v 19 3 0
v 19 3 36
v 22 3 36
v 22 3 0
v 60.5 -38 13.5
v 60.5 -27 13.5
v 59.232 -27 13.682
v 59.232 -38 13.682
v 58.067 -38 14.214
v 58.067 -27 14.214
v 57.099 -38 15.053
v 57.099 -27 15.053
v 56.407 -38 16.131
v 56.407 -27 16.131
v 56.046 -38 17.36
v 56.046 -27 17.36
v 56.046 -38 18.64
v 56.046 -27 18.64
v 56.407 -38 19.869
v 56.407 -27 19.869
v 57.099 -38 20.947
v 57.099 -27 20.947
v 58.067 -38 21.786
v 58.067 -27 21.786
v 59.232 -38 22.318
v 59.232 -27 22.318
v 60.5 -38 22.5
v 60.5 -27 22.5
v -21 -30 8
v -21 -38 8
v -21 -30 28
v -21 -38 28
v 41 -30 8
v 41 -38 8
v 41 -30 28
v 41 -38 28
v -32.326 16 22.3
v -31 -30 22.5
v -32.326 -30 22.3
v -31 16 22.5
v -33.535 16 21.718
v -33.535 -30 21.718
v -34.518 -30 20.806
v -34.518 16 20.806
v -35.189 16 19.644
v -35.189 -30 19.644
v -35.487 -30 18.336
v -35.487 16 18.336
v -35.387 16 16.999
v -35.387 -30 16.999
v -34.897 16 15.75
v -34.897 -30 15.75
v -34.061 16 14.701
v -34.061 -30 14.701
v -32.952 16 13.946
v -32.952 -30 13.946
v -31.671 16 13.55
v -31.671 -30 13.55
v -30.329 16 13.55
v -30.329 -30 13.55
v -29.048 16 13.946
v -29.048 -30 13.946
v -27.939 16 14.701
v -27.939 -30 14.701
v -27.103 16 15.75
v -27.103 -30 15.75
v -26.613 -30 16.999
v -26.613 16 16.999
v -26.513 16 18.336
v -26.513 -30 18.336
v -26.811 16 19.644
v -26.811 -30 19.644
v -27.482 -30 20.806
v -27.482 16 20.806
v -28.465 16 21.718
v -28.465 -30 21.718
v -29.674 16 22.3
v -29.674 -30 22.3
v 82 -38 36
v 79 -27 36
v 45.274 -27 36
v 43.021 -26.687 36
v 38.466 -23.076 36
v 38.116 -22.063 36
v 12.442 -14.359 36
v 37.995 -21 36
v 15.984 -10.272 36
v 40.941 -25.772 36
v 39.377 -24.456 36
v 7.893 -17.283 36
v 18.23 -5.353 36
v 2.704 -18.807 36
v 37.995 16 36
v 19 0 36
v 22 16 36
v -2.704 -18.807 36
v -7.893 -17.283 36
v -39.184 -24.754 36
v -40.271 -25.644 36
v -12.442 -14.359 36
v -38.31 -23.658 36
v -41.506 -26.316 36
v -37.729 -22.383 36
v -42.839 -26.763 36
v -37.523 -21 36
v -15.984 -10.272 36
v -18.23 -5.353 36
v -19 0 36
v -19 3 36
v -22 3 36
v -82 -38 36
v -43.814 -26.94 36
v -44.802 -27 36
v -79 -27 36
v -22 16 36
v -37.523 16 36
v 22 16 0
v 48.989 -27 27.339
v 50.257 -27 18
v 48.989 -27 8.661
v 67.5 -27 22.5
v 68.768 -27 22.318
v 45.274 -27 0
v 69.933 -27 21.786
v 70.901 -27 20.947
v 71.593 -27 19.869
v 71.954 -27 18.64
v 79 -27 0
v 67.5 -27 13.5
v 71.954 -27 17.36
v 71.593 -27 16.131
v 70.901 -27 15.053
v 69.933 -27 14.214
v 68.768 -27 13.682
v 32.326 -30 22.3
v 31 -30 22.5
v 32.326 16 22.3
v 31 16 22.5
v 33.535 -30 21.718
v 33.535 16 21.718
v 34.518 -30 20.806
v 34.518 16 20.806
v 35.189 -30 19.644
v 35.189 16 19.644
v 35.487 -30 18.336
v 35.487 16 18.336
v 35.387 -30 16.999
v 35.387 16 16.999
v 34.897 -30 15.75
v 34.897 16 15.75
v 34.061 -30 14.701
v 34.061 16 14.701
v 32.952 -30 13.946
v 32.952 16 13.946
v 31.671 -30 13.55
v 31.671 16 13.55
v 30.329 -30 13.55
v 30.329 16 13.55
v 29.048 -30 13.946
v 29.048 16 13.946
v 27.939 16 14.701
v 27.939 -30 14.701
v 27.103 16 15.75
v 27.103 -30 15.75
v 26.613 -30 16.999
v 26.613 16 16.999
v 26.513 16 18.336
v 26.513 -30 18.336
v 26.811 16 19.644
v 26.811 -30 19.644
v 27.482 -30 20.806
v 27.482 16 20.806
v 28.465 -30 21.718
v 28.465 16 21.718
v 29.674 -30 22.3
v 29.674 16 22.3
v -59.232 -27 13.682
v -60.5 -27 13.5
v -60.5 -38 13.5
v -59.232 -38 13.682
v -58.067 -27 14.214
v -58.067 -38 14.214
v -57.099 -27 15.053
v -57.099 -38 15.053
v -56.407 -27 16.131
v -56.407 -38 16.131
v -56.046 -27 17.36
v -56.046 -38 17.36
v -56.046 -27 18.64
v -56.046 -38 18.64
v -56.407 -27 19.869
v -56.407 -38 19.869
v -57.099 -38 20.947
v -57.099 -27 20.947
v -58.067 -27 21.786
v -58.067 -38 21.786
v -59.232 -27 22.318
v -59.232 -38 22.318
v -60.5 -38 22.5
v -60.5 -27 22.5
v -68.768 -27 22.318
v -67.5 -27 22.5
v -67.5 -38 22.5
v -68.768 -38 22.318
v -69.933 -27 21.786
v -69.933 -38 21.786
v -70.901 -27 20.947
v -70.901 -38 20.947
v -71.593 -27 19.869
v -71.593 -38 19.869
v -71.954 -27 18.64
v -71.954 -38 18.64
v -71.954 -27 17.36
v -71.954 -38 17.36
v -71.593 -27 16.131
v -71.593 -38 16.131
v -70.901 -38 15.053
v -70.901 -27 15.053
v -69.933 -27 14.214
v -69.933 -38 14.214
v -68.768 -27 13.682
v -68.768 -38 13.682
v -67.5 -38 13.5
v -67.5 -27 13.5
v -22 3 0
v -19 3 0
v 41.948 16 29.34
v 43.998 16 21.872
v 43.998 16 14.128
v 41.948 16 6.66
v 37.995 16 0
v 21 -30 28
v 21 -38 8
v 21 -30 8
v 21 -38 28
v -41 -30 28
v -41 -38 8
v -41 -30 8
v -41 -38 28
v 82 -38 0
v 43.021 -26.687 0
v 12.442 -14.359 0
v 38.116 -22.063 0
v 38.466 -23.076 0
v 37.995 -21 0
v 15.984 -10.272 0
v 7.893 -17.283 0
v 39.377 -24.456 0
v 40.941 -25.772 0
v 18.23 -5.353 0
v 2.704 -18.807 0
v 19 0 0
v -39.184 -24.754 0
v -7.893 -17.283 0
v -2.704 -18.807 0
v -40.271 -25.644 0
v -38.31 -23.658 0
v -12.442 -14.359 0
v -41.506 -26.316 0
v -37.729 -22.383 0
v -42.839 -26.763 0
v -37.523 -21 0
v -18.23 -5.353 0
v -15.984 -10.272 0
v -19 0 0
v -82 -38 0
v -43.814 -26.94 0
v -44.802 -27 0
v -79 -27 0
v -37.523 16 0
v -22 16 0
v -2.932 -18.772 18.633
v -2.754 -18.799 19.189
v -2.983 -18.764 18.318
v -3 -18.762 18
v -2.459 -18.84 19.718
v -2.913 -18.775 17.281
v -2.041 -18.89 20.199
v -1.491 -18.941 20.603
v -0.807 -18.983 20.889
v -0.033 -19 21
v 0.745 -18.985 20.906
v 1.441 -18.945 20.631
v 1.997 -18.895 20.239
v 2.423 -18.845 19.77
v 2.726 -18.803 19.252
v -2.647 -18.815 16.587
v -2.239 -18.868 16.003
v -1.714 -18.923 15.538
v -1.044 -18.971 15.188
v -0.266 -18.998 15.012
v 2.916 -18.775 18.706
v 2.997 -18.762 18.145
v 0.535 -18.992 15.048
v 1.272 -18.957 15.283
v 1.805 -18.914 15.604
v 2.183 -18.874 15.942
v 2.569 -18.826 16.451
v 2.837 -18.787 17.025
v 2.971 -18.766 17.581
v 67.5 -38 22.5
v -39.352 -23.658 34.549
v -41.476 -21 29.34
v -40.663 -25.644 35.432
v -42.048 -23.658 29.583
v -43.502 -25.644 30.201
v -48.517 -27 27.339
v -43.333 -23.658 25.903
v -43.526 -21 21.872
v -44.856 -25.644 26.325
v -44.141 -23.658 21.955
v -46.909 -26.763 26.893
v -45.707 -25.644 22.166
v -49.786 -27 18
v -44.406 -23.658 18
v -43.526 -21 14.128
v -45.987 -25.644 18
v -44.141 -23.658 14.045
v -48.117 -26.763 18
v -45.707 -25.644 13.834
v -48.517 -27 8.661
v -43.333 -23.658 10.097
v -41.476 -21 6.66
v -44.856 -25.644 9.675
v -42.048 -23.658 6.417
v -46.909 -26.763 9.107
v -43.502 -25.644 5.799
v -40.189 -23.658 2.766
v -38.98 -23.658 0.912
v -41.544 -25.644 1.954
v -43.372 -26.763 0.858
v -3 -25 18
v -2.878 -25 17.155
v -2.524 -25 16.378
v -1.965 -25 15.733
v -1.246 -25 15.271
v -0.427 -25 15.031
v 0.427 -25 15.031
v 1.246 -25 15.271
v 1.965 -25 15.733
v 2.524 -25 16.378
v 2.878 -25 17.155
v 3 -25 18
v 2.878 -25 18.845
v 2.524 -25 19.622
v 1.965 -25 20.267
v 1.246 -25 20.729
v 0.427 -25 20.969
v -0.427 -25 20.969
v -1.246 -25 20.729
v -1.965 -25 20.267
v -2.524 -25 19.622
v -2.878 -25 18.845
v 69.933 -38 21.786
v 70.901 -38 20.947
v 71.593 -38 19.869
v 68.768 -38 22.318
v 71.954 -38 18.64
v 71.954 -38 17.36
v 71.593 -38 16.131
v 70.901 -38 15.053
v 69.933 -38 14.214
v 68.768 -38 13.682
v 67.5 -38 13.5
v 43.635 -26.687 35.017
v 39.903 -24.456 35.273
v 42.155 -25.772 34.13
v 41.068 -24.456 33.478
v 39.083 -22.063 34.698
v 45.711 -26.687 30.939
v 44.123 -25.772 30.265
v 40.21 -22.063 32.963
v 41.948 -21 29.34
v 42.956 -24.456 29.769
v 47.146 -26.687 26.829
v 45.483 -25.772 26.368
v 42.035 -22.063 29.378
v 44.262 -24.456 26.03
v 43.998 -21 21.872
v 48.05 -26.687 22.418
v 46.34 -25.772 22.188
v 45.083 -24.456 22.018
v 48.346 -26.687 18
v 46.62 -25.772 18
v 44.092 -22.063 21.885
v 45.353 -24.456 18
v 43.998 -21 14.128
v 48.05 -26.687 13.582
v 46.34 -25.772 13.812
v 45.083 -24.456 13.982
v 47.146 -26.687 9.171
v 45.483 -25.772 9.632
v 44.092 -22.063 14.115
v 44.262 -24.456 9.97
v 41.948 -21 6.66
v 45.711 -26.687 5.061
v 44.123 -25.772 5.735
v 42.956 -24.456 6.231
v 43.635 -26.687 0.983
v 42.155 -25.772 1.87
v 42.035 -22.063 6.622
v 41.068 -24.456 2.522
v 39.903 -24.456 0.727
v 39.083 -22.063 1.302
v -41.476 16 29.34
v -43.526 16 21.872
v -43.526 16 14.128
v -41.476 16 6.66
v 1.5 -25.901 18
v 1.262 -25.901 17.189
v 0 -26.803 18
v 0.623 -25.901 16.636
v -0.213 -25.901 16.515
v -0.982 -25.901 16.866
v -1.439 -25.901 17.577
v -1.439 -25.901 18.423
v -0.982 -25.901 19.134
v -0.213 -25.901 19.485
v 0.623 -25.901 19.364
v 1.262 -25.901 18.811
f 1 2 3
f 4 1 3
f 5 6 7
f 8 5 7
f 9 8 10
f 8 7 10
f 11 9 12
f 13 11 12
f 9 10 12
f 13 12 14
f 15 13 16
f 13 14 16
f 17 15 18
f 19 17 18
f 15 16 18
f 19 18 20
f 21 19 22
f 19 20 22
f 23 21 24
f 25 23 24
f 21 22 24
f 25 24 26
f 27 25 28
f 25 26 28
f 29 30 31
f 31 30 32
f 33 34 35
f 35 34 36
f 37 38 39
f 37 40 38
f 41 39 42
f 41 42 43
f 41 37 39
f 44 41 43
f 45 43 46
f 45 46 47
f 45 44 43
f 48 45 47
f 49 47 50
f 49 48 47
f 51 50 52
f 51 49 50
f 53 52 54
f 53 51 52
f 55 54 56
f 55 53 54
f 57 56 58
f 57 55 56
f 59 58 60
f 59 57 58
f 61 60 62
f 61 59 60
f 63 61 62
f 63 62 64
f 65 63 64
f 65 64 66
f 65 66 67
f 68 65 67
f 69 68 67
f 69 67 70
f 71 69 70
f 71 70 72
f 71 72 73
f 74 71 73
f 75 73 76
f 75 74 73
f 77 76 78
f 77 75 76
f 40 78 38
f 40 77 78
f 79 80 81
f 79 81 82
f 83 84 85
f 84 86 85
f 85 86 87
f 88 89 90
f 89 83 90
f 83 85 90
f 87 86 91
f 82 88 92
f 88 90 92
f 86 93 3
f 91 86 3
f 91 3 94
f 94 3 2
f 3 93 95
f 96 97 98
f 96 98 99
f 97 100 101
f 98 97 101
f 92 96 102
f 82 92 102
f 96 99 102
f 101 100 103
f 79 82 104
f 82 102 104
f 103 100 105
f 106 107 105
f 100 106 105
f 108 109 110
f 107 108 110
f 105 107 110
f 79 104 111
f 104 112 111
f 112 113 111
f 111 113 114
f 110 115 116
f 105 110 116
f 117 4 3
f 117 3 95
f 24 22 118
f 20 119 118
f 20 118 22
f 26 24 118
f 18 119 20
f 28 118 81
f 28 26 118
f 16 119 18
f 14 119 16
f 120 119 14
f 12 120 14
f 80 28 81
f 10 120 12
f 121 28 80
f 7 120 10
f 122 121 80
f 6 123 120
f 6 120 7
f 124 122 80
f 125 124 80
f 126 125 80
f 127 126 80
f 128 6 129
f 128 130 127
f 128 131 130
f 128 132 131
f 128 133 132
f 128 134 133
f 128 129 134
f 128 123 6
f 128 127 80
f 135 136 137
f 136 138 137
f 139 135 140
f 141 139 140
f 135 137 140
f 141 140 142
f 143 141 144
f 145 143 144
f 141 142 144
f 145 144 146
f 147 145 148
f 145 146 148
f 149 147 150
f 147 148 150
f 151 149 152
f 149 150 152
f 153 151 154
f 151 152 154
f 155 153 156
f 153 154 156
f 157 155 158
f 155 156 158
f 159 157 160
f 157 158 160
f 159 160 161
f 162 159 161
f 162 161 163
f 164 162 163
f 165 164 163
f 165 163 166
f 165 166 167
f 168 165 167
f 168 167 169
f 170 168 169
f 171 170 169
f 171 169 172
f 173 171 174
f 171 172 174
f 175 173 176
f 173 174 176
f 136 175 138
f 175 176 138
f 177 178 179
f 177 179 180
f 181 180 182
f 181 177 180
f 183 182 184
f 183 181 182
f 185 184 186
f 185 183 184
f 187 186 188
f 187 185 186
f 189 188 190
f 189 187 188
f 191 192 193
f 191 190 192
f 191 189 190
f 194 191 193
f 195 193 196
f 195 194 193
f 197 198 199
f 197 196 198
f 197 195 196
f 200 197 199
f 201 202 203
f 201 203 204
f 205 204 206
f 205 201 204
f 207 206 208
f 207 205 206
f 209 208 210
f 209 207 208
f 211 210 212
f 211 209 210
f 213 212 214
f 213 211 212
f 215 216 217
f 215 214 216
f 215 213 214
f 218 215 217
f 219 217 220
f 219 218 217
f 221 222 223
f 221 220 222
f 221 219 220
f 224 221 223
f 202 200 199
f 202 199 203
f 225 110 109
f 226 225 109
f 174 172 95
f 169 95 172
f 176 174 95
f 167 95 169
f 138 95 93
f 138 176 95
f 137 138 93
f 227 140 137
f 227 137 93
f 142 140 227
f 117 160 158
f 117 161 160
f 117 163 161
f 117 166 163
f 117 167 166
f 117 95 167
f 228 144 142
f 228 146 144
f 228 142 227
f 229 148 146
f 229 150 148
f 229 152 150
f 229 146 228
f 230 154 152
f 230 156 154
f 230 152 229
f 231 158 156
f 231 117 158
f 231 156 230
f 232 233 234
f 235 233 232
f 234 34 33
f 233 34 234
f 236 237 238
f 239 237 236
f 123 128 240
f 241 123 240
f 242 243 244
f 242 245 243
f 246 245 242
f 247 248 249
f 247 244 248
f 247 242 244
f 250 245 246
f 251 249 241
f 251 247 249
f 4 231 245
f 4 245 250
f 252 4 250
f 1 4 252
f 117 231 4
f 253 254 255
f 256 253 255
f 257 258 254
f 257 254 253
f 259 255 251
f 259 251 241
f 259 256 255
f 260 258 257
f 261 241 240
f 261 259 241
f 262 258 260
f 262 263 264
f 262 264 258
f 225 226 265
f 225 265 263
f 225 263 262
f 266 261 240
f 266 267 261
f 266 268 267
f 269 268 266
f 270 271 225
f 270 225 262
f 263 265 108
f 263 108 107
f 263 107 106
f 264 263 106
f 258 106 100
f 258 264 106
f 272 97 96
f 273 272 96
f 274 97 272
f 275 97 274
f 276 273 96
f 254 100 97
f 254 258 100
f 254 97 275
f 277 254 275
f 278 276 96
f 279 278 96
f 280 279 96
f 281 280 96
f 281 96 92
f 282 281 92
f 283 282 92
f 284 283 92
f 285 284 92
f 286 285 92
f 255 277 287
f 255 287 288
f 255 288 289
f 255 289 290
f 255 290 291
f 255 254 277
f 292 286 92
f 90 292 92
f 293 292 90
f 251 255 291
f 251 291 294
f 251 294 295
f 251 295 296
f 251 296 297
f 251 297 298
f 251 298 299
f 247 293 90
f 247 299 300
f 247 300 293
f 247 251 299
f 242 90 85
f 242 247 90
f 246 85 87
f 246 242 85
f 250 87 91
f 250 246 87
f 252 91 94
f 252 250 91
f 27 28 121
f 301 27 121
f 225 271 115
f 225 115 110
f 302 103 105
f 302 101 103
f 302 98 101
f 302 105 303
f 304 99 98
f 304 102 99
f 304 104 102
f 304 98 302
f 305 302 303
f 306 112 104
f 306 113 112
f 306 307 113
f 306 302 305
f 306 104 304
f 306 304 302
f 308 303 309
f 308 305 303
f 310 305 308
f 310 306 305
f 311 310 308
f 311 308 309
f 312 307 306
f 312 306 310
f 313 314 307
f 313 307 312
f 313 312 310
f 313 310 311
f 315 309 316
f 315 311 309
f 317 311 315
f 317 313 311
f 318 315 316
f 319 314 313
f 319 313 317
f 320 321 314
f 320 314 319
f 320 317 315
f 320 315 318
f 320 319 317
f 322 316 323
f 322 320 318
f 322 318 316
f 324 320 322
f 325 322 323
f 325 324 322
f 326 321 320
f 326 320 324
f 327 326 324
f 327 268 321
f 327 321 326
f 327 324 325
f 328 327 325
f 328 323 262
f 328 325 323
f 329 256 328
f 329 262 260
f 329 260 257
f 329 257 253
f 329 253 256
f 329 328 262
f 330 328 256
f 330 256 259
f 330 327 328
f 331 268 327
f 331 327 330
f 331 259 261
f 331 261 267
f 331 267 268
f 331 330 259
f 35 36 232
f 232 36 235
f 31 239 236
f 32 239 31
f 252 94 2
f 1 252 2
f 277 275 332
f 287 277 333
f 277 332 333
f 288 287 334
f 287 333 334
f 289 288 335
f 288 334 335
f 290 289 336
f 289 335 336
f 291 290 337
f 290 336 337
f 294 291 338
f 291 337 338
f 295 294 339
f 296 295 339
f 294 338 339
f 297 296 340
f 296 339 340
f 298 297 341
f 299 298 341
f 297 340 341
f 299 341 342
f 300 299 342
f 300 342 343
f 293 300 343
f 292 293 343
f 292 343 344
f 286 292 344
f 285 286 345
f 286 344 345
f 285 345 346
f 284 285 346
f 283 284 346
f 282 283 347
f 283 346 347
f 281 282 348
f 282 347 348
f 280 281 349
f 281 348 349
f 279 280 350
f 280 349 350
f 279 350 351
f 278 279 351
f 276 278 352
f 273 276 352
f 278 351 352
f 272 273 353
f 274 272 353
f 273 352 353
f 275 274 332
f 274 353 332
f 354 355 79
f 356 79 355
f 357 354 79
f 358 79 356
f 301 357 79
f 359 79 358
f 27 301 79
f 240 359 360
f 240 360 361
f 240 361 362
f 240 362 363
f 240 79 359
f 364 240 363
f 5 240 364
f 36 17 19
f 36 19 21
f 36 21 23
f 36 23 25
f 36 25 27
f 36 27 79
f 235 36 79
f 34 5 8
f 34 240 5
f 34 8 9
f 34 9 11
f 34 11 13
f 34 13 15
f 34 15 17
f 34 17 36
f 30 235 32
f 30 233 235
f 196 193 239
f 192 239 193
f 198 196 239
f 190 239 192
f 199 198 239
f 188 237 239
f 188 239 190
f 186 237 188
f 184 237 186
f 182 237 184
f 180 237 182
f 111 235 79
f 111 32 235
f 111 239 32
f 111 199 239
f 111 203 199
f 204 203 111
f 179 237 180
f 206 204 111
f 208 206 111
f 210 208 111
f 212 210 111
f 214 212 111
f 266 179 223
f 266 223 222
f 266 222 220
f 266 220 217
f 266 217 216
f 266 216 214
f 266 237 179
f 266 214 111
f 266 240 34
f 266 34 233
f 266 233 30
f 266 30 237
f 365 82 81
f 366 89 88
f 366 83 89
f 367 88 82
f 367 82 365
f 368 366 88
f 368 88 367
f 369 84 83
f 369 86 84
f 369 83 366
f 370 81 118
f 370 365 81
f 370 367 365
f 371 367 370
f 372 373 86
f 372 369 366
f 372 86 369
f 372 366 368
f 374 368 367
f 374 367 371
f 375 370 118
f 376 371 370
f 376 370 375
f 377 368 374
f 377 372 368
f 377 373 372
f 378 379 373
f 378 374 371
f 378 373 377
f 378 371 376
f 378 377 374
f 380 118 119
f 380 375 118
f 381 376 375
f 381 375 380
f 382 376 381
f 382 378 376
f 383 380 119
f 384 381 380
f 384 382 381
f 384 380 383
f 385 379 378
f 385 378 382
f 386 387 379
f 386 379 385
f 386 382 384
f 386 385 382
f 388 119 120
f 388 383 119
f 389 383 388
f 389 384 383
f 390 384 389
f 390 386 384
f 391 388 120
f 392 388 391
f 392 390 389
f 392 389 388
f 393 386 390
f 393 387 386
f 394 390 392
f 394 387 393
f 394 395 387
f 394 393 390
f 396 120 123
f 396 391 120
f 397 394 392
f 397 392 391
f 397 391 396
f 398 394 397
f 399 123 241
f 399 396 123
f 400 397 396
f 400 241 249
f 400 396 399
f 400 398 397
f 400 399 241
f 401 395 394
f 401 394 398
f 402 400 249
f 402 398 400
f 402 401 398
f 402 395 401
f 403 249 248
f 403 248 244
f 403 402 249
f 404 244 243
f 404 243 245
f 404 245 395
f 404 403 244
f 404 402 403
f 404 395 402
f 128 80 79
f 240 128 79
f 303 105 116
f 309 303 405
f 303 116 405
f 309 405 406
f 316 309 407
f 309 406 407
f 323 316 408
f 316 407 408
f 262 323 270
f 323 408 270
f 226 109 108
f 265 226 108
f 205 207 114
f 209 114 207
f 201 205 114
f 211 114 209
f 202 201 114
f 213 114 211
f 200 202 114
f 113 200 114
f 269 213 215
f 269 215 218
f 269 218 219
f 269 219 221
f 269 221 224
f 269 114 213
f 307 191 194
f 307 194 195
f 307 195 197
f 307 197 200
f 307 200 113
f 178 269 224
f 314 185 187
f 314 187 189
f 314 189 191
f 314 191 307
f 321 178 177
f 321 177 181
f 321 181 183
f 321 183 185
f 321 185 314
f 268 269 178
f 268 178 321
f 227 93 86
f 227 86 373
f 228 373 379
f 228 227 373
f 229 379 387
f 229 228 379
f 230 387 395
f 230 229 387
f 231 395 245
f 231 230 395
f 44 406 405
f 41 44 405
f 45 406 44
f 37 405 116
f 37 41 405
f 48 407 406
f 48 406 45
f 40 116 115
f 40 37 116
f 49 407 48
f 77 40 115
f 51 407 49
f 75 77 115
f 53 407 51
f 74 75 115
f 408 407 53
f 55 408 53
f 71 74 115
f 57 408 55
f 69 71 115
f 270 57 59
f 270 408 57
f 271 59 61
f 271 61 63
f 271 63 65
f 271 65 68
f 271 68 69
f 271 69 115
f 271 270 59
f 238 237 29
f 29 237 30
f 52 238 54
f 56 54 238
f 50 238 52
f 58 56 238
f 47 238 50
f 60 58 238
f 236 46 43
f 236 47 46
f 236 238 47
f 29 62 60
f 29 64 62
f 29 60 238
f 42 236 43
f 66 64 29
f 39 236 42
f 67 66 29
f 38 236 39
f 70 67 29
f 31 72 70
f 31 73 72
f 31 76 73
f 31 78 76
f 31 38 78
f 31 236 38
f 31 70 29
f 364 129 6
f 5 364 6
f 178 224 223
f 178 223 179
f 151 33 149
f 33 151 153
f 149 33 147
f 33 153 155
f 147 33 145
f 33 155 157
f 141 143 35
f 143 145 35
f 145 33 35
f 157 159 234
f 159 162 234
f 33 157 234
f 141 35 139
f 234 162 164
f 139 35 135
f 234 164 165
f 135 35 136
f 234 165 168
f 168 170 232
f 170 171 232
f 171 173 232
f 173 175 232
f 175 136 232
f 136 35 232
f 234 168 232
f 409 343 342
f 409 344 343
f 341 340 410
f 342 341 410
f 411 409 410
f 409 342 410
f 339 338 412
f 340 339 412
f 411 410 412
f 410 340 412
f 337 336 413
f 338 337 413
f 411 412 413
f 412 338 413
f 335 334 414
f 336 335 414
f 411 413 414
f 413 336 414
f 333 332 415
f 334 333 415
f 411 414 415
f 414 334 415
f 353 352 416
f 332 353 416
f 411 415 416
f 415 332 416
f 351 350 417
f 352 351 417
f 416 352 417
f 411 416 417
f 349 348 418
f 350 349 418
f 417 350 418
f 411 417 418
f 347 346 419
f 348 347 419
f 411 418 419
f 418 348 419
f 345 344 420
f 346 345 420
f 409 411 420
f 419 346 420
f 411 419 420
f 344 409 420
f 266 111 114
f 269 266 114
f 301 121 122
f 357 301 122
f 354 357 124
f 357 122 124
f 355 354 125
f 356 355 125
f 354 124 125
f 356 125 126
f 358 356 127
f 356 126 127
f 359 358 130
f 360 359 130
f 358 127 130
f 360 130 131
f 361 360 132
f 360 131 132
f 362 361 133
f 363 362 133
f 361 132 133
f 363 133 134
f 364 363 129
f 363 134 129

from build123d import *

# Parameters (mm, degrees)
BOSS_EXTRUDE2_DEPTH       = 36
CUT_EXTRUDE1_DEPTH        = 43
FILLET1_R                 = 6
CUT_EXTRUDE2_DEPTH        = 43
FILLET2_R                 = 6
F_6_0MM_DOWEL_HOLE1_D     = 6
F_6_0MM_DOWEL_HOLE1_DEPTH = 6
F_6_0MM_DOWEL_HOLE1_TIP   = 1.802581857
SKETCH23_W                = 20
SKETCH23_H                = 20
CUT_EXTRUDE4_DEPTH        = 8
CUT_EXTRUDE5_DEPTH        = 12.0000001


with BuildPart() as part:
    # Sketch1 → Boss-Extrude2 (new body)
    with BuildSketch(Plane.XY):
        with BuildLine():
            Line((50, -27), (79, -27))
            Line((79, -27), (82, -38))
            Line((82, -38), (-82, -38))
            Line((-82, -38), (-79, -27))
            Line((-79, -27), (-50, -27))
            Line((-50, -27), (-50, 16))
            Line((-50, 16), (-22, 16))
            Line((-22, 16), (-22, 3))
            Line((-22, 3), (-19, 3))
            Line((-19, 3), (-19, 0))
            ThreePointArc((-19, 0), (0, -19), (19, 0))
            Line((19, 0), (19, 3))
            Line((19, 3), (22, 3))
            Line((22, 3), (22, 16))
            Line((22, 16), (50, 16))
            Line((50, 16), (50, -27))
        make_face()
    extrude(amount=BOSS_EXTRUDE2_DEPTH)

    # Sketch11 → Cut-Extrude1 (cut)
    with BuildSketch(Plane(origin=(0, 16, 0), x_dir=(1, 0, 0), z_dir=(0, 1, 0))):
        with BuildLine():
            Line((-50, 0), (-50, -36))
            Line((-50, -36), (-37.523326079, -36))
            ThreePointArc((-37.523326079, -36), (-43.785692077, -18), (-37.523326079, 0))
            Line((-37.523326079, 0), (-50, 0))
        make_face()
    extrude(amount=-CUT_EXTRUDE1_DEPTH, mode=Mode.SUBTRACT)

    # Fillet1
    fillet1_edges = [part.edges().sort_by_distance(p)[0] for p in [
        (-43.785692077, -27, 18),
    ]]
    fillet(fillet1_edges, radius=FILLET1_R)

    # Sketch12 → Cut-Extrude2 (cut)
    with BuildSketch(Plane(origin=(0, 16, 0), x_dir=(1, 0, 0), z_dir=(0, 1, 0))):
        with BuildLine():
            Line((37.994971795, 0), (50, 0))
            Line((50, 0), (50, -36))
            Line((50, -36), (37.994971795, -36))
            ThreePointArc((37.994971795, -36), (44.257337793, -18), (37.994971795, 0))
        make_face()
    extrude(amount=-CUT_EXTRUDE2_DEPTH, mode=Mode.SUBTRACT)

    # Fillet2
    fillet2_edges = [part.edges().sort_by_distance(p)[0] for p in [
        (44.257337793, -27, 18),
    ]]
    fillet(fillet2_edges, radius=FILLET2_R)

    # Ø6.0mm Dowel Hole1
    with Locations(Plane(origin=(0, -19, 18), x_dir=(1, 0, 0), z_dir=(0, 1, 0))):
        with Locations((0, 0)):
            Hole(F_6_0MM_DOWEL_HOLE1_D / 2, depth=F_6_0MM_DOWEL_HOLE1_DEPTH)
            with Locations((0, 0, -(F_6_0MM_DOWEL_HOLE1_DEPTH + F_6_0MM_DOWEL_HOLE1_TIP / 2))):  # 118° drill point
                Cone(0, F_6_0MM_DOWEL_HOLE1_D / 2, F_6_0MM_DOWEL_HOLE1_TIP, mode=Mode.SUBTRACT)

    # Sketch19 → Ø6.0mm Dowel Hole3 (revolve, cut)
    with BuildSketch(Plane(origin=(-31, 16, 18), x_dir=(0, 0, 1), z_dir=(1, 0, 0))):
        Polygon((0, 0), (0, 48.703872786), (4.5, 46), (4.5, 0), align=None)
    f_6_0mm_dowel_hole3 = revolve(axis=Axis((-31, 22.35, 18), (0, -1, 0)), mode=Mode.SUBTRACT)

    # Sketch23 → Cut-Extrude4 (cut)
    with BuildSketch(Plane.XZ.offset(38)):
        with Locations((-31, 18)):
            Rectangle(SKETCH23_W, SKETCH23_H)
    cut_extrude4 = extrude(amount=-CUT_EXTRUDE4_DEPTH, mode=Mode.SUBTRACT)

    # Mirror1: Ø6.0mm Dowel Hole3, Cut-Extrude4 across plane
    add(f_6_0mm_dowel_hole3.mirror(Plane(origin=(0, 0, 0), x_dir=(0, 0, 1), z_dir=(1, 0, 0))), mode=Mode.SUBTRACT)
    add(cut_extrude4.mirror(Plane(origin=(0, 0, 0), x_dir=(0, 0, 1), z_dir=(1, 0, 0))), mode=Mode.SUBTRACT)

    # Sketch25 → Cut-Extrude5 (cut, through all)
    with BuildSketch(Plane(origin=(0, -27, 0), x_dir=(1, 0, 0), z_dir=(0, 1, 0))):
        with BuildLine():
            Line((-67.5, -13.5), (-60.5, -13.5))
            ThreePointArc((-60.5, -13.5), (-56, -18), (-60.5, -22.5))
            Line((-60.5, -22.5), (-67.5, -22.5))
            ThreePointArc((-67.5, -22.5), (-72, -18), (-67.5, -13.5))
        make_face()
    cut_extrude5 = extrude(amount=-CUT_EXTRUDE5_DEPTH, mode=Mode.SUBTRACT)

    # Mirror2: Cut-Extrude5 across plane
    add(cut_extrude5.mirror(Plane(origin=(0, 0, 0), x_dir=(0, 0, 1), z_dir=(1, 0, 0))), mode=Mode.SUBTRACT)


solid = part.part
